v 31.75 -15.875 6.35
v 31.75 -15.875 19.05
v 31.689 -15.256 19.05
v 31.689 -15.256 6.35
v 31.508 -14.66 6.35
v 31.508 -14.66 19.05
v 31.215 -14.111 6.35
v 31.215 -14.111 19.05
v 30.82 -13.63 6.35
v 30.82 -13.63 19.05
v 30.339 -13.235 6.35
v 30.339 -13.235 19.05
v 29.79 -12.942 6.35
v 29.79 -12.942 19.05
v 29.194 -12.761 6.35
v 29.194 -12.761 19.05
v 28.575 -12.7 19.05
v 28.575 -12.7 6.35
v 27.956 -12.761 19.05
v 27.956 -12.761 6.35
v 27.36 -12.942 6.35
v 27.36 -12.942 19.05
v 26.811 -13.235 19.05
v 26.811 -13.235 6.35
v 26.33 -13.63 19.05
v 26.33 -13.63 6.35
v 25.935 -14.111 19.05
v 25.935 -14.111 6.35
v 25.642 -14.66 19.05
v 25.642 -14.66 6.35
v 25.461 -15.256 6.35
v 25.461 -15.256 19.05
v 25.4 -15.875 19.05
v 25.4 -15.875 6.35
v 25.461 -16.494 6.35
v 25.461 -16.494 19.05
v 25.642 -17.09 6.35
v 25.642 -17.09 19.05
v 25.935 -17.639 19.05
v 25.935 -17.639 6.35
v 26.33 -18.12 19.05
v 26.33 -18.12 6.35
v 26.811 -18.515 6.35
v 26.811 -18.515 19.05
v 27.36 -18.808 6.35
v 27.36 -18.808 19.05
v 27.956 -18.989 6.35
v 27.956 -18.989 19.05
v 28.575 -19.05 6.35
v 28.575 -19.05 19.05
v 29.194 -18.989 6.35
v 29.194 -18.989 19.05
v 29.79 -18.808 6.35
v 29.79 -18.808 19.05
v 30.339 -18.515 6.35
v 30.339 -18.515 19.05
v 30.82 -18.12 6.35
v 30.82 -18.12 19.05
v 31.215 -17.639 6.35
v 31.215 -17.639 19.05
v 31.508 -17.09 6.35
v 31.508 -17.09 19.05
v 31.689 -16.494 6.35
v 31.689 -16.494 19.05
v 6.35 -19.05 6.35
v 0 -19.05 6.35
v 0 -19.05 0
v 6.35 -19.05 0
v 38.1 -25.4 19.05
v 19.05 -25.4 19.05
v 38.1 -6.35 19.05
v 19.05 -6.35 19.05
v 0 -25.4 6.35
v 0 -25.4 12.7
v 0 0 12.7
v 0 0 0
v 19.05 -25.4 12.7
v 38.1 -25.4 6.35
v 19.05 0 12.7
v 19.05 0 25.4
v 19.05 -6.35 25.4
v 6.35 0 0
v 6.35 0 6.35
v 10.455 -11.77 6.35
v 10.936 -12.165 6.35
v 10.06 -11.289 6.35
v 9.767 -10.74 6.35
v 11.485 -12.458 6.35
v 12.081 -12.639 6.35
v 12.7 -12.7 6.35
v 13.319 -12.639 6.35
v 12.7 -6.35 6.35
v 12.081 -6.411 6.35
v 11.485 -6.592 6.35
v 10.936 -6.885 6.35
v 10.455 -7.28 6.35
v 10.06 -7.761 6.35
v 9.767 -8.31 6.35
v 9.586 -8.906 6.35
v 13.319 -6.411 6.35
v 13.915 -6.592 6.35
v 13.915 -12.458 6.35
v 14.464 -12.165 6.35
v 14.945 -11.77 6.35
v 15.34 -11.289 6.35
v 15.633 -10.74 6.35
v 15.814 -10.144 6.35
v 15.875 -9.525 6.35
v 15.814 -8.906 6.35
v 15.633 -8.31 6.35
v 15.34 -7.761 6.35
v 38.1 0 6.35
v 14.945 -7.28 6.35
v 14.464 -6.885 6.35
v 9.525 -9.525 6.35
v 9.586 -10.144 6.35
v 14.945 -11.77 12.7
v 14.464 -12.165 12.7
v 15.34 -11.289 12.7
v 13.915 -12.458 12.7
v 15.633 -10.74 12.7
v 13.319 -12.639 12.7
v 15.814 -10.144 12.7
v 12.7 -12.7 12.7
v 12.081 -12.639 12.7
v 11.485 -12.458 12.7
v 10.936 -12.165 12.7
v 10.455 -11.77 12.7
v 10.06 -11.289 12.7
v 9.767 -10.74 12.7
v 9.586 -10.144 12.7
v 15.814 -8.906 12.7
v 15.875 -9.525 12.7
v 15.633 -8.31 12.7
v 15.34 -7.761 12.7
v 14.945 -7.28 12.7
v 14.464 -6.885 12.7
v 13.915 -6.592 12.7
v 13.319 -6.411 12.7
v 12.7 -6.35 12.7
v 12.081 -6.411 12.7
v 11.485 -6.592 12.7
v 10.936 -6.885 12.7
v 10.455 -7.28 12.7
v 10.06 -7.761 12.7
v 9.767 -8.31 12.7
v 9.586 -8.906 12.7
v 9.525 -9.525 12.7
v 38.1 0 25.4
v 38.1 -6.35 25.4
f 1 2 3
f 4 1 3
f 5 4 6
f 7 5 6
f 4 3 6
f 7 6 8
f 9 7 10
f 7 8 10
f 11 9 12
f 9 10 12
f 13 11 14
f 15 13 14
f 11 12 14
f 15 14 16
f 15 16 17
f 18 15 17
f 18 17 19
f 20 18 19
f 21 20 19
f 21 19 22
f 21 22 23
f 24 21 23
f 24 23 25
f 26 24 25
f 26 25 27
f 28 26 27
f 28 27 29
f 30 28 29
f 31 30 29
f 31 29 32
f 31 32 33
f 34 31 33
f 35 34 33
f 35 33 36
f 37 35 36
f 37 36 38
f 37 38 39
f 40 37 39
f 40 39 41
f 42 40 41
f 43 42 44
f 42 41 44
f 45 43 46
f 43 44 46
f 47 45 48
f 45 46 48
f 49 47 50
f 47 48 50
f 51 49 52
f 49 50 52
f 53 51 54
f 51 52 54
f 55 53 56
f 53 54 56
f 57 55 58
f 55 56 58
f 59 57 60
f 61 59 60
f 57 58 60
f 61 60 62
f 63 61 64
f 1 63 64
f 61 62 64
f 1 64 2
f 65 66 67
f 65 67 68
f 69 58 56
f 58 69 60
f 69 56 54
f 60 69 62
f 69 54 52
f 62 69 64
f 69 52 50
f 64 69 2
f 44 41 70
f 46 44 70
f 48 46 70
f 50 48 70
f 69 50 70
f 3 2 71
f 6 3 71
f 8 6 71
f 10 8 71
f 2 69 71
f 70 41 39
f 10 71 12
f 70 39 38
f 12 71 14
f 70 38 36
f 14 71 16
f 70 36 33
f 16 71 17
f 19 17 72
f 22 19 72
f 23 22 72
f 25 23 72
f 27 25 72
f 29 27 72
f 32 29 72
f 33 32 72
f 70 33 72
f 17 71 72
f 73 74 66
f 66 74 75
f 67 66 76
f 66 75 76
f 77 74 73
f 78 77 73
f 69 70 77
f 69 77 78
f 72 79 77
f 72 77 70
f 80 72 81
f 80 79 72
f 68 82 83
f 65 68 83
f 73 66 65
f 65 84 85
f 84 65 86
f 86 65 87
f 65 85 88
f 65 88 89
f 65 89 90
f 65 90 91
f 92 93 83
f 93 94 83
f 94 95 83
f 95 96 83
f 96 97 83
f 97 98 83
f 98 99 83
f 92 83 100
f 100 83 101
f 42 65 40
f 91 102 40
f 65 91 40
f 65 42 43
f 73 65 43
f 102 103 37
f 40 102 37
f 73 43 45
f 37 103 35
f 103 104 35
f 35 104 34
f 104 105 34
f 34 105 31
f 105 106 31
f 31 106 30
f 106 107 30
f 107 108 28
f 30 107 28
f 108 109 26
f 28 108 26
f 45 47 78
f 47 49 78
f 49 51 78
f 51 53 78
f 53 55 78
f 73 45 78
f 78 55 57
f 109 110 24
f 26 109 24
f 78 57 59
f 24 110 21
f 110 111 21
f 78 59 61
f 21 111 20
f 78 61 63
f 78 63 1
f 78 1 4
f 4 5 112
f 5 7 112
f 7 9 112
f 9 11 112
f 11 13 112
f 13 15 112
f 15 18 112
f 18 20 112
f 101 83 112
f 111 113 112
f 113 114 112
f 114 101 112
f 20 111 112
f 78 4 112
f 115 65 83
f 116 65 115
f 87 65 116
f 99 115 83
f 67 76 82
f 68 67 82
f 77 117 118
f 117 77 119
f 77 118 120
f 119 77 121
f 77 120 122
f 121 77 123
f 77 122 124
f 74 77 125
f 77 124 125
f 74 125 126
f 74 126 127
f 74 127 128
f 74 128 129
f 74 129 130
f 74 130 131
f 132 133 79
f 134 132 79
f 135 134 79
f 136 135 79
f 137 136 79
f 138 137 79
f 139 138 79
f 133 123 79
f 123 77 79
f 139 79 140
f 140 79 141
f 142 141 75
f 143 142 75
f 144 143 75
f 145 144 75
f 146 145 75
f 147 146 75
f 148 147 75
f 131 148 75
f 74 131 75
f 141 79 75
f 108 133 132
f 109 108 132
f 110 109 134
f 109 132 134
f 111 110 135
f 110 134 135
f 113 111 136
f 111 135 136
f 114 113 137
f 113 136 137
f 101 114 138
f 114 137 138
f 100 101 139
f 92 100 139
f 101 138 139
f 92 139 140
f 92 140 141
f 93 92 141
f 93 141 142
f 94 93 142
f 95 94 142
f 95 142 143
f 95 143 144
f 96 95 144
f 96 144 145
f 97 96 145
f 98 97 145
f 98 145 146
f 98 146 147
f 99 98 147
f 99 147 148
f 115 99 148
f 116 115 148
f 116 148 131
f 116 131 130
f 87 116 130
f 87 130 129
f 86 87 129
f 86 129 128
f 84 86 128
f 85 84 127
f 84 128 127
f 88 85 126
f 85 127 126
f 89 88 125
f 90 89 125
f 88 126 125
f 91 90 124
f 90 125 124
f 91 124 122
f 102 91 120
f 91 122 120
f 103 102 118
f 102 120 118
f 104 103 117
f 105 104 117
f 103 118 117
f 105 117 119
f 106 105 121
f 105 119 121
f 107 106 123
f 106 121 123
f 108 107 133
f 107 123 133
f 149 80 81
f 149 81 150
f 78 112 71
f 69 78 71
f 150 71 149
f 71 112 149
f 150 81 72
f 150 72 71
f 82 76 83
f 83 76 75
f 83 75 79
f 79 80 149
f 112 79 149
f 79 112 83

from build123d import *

# Parameters (mm, degrees)
F0_W     = 6.35
F0_H     = 6.35
F1_DEPTH = 19.05
F2_DEPTH = 25.4
F0_W_2   = 19.05
F3_DEPTH = 6.35
F4_R     = 3.175
F5_DEPTH = 25.4
F6_R     = 3.175
F7_DEPTH = 25.4


with BuildPart() as f1:
    # F0 (on Front) → F1 (new body)
    with BuildSketch(Plane.XZ):
        with Locations((3.175, 3.175)):
            Rectangle(F0_W, F0_H)
    extrude(amount=F1_DEPTH)

    # F0 (on Front) → F2 (join)
    with BuildSketch(Plane.XZ):
        Polygon((0, 12.7), (0, 6.35), (6.35, 6.35), (38.1, 6.35), (38.1, 19.05), (19.05, 19.05), (19.05, 12.7), align=None)
    extrude(amount=F2_DEPTH)

    # F0 (on Front) → F3 (join)
    with BuildSketch(Plane.XZ):
        with Locations((28.575, 22.225)):
            Rectangle(F0_W_2, F0_H)
    extrude(amount=F3_DEPTH)

    # F4 (on face) → F5 (cut)
    with BuildSketch(Plane.XY.offset(12.7)):
        with Locations((12.7, -9.525)):
            Circle(F4_R)
    extrude(amount=-F5_DEPTH, mode=Mode.SUBTRACT)

    # F6 (on face) → F7 (cut)
    with BuildSketch(Plane.XY.offset(19.05)):
        with Locations((28.575, -15.875)):
            Circle(F6_R)
    extrude(amount=-F7_DEPTH, mode=Mode.SUBTRACT)


solid = f1.part
